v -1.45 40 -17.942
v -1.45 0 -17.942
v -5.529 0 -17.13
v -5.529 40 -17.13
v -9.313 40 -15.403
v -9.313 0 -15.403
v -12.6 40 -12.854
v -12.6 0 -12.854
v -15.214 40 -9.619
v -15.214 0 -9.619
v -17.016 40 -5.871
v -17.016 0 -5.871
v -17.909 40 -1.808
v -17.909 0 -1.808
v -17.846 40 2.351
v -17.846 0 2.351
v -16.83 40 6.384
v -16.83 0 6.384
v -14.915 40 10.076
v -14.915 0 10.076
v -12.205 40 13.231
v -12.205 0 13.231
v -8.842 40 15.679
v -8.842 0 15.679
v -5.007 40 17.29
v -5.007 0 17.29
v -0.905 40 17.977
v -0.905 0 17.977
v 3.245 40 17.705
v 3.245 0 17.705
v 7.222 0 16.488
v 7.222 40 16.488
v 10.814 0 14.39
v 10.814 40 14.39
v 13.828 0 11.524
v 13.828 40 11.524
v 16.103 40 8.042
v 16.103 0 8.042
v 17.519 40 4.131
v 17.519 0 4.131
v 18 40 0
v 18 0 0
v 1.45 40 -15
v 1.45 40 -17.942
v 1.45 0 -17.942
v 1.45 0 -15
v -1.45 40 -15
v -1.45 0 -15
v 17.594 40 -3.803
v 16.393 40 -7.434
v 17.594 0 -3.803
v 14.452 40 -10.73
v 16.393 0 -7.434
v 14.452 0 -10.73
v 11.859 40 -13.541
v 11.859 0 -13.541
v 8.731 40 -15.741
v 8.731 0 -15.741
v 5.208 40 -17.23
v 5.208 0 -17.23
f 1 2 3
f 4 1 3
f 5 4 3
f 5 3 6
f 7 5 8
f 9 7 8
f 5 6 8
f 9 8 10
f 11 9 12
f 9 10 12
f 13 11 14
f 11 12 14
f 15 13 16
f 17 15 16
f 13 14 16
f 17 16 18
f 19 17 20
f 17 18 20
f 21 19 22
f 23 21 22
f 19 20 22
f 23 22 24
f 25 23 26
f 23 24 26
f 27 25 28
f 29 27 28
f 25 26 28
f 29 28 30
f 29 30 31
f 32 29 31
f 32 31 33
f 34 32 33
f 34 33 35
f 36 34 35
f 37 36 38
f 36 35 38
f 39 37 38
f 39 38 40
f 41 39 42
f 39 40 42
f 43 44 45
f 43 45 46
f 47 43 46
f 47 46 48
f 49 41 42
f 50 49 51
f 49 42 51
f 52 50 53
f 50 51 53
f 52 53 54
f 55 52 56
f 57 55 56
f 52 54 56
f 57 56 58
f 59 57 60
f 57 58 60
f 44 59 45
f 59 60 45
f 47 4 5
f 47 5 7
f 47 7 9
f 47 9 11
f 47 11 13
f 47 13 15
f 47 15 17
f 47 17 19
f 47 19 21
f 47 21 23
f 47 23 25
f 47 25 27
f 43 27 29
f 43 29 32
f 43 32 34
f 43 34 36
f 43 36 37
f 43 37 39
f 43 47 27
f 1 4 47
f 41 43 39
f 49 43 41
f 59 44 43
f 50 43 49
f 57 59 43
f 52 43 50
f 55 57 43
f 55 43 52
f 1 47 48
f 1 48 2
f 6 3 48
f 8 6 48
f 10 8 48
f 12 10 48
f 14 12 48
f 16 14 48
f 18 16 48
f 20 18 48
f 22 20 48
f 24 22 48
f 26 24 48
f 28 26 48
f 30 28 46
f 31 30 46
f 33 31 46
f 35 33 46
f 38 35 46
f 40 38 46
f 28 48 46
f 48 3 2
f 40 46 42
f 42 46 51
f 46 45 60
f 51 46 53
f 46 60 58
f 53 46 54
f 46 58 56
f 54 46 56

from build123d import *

# Parameters (mm, degrees)
BOSS_EXTRUDE1_DEPTH = 40


with BuildPart() as part:
    # Sketch1 → Boss-Extrude1 (new body)
    with BuildSketch(Plane(origin=(0, 0, 0), x_dir=(1, 0, 0), z_dir=(0, 1, 0))):
        with BuildLine():
            Line((1.45, 17.941502167), (1.45, 15))
            Line((1.45, 15), (-1.45, 15))
            Line((-1.45, 15), (-1.45, 17.941502167))
            ThreePointArc((-1.45, 17.941502167), (-12.204507364, -13.230646243), (18, 0))
            ThreePointArc((18, 0), (13.230646243, 12.204507364), (1.45, 17.941502167))
        make_face()
    extrude(amount=BOSS_EXTRUDE1_DEPTH)


solid = part.part
